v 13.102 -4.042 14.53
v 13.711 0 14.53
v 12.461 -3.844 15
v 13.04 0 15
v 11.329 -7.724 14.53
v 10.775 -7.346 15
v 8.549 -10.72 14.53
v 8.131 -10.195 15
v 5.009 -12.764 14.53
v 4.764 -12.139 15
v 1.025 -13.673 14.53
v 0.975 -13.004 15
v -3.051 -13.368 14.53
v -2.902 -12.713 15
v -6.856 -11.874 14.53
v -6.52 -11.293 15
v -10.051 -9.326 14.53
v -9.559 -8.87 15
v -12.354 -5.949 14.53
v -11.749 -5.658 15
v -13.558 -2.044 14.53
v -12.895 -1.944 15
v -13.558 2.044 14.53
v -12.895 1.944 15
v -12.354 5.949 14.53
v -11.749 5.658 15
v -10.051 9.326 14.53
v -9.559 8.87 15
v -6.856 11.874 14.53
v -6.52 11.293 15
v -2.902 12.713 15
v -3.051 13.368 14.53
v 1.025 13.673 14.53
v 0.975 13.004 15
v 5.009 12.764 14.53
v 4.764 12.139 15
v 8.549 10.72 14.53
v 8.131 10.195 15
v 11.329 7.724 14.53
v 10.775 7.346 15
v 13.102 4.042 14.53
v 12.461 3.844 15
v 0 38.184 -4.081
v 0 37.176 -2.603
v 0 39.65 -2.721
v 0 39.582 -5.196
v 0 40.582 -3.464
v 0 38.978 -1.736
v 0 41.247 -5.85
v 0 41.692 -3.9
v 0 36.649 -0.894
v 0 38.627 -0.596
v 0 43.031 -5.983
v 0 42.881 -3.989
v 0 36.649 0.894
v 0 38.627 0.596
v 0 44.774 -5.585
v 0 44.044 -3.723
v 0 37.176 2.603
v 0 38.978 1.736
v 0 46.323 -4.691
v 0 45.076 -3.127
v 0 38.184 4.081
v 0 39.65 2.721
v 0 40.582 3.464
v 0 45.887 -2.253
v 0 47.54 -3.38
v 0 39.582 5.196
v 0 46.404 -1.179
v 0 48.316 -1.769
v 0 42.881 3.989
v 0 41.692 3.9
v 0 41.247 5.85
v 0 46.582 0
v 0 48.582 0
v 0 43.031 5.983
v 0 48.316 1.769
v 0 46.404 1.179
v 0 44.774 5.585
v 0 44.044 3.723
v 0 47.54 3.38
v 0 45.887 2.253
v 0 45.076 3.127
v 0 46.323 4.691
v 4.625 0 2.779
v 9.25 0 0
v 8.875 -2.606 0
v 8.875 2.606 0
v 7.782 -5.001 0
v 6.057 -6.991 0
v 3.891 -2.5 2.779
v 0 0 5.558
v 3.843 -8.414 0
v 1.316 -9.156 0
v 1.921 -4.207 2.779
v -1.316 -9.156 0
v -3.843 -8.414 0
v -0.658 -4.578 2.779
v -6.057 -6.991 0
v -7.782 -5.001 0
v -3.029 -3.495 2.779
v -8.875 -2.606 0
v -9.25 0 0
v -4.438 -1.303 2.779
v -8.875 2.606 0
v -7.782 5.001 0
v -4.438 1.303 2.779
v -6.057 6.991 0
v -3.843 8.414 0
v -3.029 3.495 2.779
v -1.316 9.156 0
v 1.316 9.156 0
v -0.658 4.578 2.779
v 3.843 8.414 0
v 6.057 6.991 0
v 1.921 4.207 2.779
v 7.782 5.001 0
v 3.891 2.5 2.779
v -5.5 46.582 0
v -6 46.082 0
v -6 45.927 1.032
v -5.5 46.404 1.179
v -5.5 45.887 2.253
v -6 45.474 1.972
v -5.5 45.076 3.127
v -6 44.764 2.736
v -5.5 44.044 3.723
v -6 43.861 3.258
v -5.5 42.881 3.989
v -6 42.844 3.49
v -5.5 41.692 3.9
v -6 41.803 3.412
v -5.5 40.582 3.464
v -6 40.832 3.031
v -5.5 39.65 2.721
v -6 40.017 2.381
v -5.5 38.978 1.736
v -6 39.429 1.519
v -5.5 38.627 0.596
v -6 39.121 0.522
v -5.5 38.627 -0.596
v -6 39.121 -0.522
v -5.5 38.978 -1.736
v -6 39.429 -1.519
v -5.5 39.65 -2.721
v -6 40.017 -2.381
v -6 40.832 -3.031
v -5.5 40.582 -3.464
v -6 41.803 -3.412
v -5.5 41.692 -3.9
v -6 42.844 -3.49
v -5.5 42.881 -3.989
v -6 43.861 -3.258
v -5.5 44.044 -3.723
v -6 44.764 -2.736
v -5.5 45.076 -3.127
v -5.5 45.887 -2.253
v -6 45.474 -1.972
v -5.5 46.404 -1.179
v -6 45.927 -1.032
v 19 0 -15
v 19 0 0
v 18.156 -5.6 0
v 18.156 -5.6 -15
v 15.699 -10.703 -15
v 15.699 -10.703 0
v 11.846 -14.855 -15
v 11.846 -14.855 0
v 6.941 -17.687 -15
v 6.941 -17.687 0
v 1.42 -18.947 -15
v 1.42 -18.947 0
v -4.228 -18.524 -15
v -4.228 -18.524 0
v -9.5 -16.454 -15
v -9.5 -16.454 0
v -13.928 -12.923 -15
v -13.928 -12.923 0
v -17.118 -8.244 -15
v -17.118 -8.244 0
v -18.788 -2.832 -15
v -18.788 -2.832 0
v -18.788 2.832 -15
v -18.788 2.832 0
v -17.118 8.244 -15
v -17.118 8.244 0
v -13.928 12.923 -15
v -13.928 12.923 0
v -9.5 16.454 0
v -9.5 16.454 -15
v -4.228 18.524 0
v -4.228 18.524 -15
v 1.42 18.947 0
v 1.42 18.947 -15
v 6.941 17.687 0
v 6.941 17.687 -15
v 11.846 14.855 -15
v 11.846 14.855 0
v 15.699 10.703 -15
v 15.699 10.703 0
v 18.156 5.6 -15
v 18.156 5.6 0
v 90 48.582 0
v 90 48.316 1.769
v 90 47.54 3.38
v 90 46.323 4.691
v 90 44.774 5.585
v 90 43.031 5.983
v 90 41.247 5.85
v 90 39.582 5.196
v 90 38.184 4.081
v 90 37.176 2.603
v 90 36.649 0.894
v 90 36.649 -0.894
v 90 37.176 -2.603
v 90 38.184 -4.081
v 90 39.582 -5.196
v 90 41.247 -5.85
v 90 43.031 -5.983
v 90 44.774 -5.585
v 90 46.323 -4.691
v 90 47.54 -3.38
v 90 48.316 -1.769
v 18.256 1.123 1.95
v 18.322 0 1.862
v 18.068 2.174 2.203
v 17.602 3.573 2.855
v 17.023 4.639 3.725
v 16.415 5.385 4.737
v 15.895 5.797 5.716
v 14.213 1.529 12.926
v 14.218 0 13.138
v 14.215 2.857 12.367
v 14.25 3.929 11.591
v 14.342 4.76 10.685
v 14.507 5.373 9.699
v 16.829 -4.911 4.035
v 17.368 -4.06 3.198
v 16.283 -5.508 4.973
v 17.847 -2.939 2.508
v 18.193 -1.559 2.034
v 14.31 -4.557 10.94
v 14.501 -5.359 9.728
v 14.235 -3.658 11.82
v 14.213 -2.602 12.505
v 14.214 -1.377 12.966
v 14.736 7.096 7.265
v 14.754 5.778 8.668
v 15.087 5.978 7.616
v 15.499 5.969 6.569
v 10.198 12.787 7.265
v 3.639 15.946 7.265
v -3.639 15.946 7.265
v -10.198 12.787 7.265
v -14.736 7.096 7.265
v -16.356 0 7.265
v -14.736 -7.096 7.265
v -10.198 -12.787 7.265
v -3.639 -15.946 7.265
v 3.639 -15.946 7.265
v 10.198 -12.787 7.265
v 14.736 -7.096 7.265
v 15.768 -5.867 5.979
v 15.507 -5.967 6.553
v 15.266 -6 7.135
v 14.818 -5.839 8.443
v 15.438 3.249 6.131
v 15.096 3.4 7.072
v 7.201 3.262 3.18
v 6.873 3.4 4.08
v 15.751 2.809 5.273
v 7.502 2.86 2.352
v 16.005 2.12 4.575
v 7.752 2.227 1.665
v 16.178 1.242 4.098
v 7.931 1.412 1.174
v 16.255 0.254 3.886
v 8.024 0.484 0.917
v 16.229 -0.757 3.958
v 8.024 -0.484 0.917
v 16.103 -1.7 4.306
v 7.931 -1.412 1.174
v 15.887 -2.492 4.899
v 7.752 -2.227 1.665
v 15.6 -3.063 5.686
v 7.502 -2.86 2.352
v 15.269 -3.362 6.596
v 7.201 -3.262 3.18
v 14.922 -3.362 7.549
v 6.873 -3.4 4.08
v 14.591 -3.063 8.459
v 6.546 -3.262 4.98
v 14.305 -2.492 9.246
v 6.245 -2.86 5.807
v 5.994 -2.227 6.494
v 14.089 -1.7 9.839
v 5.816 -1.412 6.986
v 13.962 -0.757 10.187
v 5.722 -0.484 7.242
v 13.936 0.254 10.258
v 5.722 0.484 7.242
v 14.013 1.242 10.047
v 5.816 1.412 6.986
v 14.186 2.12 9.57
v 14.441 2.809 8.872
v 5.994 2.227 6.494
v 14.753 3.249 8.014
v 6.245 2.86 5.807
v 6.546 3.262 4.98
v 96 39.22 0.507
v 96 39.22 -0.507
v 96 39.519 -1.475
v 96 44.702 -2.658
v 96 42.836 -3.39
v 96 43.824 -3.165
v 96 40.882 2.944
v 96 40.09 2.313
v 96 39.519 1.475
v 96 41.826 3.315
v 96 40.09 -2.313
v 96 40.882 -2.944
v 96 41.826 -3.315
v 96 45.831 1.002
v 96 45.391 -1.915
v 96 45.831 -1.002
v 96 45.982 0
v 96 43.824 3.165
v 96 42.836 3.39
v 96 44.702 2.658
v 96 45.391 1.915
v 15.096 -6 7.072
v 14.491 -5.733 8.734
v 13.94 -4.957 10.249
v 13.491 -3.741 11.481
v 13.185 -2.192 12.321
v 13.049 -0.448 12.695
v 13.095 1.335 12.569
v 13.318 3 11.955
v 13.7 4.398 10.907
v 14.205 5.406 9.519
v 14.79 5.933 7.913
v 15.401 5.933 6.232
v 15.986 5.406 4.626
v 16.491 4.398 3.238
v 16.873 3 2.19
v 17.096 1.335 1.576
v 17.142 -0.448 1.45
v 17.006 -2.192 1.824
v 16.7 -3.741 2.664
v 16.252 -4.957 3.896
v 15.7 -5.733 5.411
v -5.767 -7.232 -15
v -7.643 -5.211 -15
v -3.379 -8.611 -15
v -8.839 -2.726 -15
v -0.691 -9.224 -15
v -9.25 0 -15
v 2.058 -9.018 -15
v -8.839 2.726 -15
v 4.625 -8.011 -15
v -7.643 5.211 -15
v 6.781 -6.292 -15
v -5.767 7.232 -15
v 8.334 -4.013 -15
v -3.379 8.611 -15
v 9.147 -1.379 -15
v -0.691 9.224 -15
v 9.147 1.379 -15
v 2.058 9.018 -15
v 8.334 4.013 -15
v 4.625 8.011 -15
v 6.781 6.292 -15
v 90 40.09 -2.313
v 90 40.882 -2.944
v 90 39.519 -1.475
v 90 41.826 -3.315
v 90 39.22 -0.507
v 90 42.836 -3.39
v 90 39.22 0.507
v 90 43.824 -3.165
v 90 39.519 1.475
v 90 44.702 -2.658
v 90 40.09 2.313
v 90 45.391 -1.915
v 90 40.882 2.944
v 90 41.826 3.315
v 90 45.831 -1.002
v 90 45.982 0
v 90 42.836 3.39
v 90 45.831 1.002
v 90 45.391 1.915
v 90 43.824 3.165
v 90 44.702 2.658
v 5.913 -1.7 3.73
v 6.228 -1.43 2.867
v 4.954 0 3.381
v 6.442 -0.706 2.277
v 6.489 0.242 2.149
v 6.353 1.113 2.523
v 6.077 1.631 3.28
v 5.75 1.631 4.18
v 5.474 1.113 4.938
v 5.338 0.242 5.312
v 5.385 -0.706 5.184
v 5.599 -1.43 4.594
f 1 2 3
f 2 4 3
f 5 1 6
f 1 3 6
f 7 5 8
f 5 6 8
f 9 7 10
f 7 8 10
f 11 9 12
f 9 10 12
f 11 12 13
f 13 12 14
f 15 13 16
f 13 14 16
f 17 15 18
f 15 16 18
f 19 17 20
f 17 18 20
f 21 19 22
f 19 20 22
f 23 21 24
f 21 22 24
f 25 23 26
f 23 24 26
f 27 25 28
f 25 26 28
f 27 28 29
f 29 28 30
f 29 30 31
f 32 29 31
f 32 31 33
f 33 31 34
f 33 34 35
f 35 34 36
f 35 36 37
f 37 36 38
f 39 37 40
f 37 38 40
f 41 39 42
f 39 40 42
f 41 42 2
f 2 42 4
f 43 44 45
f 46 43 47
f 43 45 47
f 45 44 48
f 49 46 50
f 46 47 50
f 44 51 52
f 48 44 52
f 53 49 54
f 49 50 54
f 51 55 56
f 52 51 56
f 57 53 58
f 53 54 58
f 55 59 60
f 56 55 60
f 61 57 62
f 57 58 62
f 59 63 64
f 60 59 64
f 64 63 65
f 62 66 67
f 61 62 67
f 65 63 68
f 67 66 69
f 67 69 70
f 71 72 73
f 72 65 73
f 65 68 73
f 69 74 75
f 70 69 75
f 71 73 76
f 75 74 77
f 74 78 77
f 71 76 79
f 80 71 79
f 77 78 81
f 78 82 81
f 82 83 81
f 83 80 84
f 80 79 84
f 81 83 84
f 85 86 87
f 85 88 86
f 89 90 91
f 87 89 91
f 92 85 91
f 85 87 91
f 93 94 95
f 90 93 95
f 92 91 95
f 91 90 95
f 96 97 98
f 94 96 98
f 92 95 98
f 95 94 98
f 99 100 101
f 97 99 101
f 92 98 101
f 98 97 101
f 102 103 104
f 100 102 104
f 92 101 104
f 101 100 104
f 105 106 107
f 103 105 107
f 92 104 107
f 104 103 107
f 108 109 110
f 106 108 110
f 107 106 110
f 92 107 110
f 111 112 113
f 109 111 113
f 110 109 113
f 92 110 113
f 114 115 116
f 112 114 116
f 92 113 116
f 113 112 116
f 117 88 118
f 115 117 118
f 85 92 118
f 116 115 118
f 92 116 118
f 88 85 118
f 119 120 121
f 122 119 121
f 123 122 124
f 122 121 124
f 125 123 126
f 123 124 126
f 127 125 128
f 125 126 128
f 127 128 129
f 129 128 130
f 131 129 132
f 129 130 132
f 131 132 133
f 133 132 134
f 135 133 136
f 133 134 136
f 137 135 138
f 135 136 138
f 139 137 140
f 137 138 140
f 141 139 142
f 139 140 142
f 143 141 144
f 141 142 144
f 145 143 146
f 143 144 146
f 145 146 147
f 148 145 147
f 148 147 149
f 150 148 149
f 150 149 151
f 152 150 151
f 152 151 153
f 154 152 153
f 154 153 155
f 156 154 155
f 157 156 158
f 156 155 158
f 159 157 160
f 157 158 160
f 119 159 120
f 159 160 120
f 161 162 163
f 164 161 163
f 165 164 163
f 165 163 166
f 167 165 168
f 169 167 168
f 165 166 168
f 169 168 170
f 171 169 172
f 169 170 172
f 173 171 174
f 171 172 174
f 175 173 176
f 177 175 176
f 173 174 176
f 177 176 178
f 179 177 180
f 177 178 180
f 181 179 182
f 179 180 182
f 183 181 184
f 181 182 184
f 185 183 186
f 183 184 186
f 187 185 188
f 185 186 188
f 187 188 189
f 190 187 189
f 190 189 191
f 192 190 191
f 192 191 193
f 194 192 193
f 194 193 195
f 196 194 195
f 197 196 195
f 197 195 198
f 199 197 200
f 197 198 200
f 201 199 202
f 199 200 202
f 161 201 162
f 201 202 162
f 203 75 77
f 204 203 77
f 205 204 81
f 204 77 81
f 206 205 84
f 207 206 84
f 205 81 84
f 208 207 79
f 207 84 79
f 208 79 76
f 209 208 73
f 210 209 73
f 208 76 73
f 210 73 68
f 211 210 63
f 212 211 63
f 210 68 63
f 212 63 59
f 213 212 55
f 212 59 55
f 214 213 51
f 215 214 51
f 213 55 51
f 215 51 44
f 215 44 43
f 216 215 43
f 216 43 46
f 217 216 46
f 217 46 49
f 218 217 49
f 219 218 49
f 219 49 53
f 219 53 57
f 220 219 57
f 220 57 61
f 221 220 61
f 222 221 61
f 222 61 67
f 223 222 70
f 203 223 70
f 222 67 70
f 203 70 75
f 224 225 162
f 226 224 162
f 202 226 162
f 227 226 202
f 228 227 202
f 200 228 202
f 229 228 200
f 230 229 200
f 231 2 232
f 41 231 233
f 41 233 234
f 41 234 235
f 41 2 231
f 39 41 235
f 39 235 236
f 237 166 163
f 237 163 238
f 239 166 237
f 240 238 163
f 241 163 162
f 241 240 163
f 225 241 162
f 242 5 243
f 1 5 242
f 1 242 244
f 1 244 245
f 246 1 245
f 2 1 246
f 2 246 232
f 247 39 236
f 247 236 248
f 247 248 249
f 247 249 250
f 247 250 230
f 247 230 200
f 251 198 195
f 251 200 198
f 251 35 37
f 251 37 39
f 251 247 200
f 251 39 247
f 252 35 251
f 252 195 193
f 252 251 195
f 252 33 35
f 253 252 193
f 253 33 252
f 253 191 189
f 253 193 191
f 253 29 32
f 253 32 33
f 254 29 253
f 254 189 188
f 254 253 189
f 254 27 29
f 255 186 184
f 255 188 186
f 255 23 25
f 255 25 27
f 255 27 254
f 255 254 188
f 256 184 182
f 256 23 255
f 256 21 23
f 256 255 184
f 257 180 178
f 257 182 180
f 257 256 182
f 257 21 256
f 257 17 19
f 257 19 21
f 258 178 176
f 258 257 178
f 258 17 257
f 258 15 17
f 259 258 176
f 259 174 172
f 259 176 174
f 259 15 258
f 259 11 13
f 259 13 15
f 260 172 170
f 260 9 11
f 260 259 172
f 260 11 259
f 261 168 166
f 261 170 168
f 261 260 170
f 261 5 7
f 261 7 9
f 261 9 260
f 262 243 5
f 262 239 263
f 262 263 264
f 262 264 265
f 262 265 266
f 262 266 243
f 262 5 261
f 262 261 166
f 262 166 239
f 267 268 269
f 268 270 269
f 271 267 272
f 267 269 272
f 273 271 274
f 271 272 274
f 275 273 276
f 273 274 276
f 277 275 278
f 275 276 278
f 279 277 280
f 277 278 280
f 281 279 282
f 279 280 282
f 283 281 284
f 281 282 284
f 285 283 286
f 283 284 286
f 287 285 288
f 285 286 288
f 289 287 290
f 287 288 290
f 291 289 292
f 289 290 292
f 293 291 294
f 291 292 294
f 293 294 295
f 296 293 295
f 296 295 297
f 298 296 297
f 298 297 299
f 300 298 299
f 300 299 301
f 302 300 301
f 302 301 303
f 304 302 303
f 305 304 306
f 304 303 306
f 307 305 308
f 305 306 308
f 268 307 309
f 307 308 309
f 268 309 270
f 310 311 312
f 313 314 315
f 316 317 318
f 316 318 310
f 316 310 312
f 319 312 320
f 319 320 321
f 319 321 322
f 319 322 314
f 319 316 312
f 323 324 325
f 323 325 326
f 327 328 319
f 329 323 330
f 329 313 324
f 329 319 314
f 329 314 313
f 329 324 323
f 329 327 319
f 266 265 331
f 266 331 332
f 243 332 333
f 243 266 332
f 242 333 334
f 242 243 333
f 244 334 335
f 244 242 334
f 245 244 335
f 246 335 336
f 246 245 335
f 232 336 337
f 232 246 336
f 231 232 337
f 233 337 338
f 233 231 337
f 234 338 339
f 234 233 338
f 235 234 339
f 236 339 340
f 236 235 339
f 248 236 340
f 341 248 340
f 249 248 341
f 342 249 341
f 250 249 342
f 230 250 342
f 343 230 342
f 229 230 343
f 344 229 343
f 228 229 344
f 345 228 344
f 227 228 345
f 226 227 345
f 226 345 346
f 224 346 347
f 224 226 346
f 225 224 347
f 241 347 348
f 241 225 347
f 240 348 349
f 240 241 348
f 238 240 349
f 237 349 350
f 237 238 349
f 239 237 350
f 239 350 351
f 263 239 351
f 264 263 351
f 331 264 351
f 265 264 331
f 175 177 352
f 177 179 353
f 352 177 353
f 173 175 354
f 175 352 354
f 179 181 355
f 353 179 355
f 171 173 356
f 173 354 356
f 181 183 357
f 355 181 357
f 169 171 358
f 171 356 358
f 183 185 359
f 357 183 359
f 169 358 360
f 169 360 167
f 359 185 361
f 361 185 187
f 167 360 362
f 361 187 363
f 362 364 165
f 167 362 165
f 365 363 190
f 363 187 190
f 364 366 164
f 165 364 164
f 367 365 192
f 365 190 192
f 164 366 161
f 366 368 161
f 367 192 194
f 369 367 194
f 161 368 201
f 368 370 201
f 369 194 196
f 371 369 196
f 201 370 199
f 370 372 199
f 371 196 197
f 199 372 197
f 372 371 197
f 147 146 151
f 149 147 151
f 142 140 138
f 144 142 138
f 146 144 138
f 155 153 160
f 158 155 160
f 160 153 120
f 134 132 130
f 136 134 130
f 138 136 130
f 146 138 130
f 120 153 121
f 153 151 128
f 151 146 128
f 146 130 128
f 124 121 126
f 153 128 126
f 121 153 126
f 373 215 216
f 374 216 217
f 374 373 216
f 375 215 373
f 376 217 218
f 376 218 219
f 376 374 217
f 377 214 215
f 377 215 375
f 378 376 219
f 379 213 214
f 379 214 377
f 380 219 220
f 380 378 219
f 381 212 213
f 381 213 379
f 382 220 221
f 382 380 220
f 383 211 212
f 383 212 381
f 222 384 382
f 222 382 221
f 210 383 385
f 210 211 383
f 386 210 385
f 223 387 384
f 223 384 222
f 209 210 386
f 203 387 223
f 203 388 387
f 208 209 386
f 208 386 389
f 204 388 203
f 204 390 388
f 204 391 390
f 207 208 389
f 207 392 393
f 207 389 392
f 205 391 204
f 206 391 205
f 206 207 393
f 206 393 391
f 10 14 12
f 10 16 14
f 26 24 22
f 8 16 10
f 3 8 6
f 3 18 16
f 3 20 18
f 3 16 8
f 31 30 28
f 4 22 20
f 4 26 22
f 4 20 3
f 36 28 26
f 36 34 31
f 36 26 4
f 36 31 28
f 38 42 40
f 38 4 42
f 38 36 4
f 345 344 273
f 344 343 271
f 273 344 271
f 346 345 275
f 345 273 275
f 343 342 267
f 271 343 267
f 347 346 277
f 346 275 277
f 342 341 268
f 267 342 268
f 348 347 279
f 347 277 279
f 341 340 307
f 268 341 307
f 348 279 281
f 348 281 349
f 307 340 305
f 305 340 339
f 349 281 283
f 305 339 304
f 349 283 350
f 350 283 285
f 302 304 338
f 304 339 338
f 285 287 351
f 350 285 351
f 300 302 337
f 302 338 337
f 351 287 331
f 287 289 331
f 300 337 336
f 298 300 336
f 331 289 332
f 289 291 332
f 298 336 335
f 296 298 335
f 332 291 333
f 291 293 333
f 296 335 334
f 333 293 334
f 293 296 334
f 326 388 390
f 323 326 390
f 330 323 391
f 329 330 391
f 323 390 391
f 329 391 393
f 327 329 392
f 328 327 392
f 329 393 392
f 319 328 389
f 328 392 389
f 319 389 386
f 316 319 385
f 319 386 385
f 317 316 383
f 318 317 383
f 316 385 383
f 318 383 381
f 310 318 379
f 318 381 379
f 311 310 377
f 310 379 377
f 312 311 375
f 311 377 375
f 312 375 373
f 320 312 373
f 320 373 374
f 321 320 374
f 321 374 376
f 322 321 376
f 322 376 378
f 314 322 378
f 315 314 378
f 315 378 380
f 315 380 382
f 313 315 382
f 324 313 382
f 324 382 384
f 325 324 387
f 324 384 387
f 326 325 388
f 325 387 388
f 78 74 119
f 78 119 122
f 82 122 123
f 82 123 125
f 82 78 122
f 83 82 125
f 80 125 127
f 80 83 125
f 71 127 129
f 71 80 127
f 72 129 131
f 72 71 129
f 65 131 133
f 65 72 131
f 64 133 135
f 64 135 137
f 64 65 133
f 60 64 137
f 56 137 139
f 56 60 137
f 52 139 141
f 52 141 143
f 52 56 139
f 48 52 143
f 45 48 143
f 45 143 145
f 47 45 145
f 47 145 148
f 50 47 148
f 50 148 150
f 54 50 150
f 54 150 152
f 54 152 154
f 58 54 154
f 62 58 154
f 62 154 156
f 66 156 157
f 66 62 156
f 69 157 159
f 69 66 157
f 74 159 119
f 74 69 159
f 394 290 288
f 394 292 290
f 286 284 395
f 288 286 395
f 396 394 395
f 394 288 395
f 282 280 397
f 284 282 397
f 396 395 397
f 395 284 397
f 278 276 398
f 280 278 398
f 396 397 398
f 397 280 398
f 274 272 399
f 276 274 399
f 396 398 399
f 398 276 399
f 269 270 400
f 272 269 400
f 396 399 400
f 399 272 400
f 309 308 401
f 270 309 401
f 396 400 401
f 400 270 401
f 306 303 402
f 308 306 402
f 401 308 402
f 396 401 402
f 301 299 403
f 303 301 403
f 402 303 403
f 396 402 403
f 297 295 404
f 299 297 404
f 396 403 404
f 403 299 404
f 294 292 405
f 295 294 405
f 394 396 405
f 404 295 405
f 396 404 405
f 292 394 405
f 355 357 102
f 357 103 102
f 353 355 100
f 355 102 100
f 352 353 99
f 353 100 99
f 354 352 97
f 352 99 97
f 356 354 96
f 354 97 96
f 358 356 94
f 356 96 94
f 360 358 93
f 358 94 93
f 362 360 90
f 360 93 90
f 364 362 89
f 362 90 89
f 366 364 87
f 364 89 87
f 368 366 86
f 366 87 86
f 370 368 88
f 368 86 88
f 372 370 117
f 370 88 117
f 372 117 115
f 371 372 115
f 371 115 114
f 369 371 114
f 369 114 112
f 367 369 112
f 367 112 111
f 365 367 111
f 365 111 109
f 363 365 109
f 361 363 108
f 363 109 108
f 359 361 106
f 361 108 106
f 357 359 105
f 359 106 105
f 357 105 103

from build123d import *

# Parameters (mm, degrees)
F0_R       = 19
F1_DEPTH   = 15
F1_TAPER   = 20
F2_DEPTH   = 15
F6_R       = 6
F7_DEPTH   = 1.25
F8_D       = 6.8
F8_DEPTH   = 10
F8_TIP     = 2.0429261047
F10_D      = 18.5
F10_DEPTH  = 15
F10_TIP    = 5.557960726
F11_R      = 4
F12_DEPTH  = 6
F11_R_2    = 6
F12_FACE_R = 4
F13_DEPTH  = 90
F14_SIZE   = 0.5
F15_R      = 3.4
F16_DEPTH  = 6


# Not quite as in the source:
# - a fillet or chamfer that OpenCascade refuses, or shapes differently, is made with other operations: its cross-section is extruded or revolved along the edge and cut away or added
# - the program builds the solid bodies; features that only make, move or delete a surface that nothing else refers to are left out


with BuildPart() as f1:
    # F0 (on Top) → F1 (new body)
    with BuildSketch(Plane.XY):
        Circle(F0_R)
    extrude(amount=F1_DEPTH, taper=F1_TAPER)

    # F2 (add): a face of the model
    f2_faces = [f1.faces().sort_by_distance(p)[0] for p in [
        (0, 0, 0),
    ]]
    extrude(f2_faces, amount=F2_DEPTH)

    # F4: chamfer of 0.5 on 1 edges, made by hand

    # F4_s1 → F4_t2 (revolve, cut)
    with BuildSketch(Plane.XZ):
        Polygon((13.7114565577, 14.5301536896), (13.040446486, 15), (13.540446486, 15), align=None)
    revolve(axis=Axis((0, 0, 15), (0, 0, -1)), mode=Mode.SUBTRACT)

    # F6 (on line) → F7 (cut)
    with BuildSketch(Plane(origin=(16.7774222096, 0, 6.106482292), x_dir=(0, -1, 0), z_dir=(-0.9396926208, 0, -0.3420201433))):
        with Locations((0, 1.4829505704)):
            Circle(F6_R)
    extrude(amount=F7_DEPTH, mode=Mode.SUBTRACT)

    # F8
    with Locations(Plane(origin=(16.7774222096, 0, 6.106482292), x_dir=(0, -1, 0), z_dir=(0.9396926208, 0, 0.3420201433))):
        with Locations((0, -1.4829505704)):
            Hole(F8_D / 2, depth=F8_DEPTH)
            with Locations((0, 0, -(F8_DEPTH + F8_TIP / 2))):  # 118° drill point
                Cone(0, F8_D / 2, F8_TIP, mode=Mode.SUBTRACT)

    # F10
    with Locations(Plane(origin=(0, 0, -15), x_dir=(1, 0, 0), z_dir=(0, 0, -1))):
        with Locations((0, 0)):
            Hole(F10_D / 2, depth=F10_DEPTH)
            with Locations((0, 0, -(F10_DEPTH + F10_TIP / 2))):  # 118° drill point
                Cone(0, F10_D / 2, F10_TIP, mode=Mode.SUBTRACT)


with BuildPart() as f12:
    # F11 (on Right) → F12 (new body)
    with BuildSketch(Plane.YZ):
        with Locations((42.5821989775, 0)):
            Circle(F11_R)
    extrude(amount=-F12_DEPTH)

    # F11 (on Right) + F12_face (on face) → F13 (join)
    with BuildSketch(Plane.YZ):
        with Locations((42.5821989775, 0)):
            Circle(F11_R_2)
        with Locations((42.5821989775, 0)):
            Circle(F11_R, mode=Mode.SUBTRACT)
    with BuildSketch(Plane(origin=(0, 42.5821989775, 0), x_dir=(0, 1, 0), z_dir=(1, 0, 0))):
        Circle(F12_FACE_R)
    extrude(amount=F13_DEPTH)

    # F14
    f14_edges = [f12.edges().sort_by_distance(p)[0] for p in [
        (-6, 38.582199, 0),
    ]]
    chamfer(f14_edges, length=F14_SIZE)

    # F15 (on face) → F16 (join)
    with BuildSketch(Plane.YZ.offset(90)):
        with Locations((42.5821989775, 0)):
            Circle(F15_R)
    extrude(amount=F16_DEPTH)


solid = Compound([f1.part, f12.part])
